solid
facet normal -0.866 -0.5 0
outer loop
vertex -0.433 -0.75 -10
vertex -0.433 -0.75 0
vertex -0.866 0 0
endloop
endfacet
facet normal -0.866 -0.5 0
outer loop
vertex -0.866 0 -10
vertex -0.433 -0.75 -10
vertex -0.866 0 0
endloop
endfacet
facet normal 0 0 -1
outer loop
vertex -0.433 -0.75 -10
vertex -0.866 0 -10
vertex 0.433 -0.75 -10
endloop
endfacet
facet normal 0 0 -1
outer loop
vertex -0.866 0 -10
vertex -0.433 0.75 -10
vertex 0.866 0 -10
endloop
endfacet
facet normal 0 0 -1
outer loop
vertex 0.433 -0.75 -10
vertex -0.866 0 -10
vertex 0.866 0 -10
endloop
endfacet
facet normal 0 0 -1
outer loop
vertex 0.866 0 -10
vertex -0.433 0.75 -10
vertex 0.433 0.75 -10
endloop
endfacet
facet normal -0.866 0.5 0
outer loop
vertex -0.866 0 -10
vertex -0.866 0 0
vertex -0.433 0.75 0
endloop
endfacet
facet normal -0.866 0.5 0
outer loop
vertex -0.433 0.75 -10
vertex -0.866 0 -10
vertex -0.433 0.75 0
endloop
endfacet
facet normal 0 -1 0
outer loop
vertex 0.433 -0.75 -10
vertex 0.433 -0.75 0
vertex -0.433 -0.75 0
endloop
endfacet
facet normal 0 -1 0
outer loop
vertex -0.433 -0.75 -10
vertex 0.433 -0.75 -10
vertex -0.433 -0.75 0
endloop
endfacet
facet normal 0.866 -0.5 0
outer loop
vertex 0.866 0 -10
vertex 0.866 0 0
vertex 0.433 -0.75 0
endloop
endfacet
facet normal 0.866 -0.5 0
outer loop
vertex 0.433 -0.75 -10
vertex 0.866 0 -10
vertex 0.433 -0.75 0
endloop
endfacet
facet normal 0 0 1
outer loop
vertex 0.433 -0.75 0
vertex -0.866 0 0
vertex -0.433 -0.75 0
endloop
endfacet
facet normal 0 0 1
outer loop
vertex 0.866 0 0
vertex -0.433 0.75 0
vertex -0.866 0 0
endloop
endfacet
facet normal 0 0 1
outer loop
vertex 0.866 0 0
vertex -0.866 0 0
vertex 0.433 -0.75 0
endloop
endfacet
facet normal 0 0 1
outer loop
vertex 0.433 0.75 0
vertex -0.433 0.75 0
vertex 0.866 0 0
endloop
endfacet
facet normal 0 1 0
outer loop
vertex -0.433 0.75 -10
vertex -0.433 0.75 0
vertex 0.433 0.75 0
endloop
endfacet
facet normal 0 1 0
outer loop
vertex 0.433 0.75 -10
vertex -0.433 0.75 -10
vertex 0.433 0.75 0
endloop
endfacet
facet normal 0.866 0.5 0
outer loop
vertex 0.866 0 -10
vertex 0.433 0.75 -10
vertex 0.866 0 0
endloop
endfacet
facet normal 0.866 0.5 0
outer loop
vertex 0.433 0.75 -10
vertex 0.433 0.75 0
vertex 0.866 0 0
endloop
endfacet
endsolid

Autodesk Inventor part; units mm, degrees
ref_plane "YZ Plane" through (0, 0, 0) normal (1, 0, 0) x (0, 1, 0)
ref_plane "XZ Plane" through (0, 0, 0) normal (0, 1, 0) x (-1, 0, 0)
ref_plane "XY Plane" through (0, 0, 0) normal (0, 0, 1) x (1, 0, 0)
sketch "Sketch1" plane through (0, 0, 0) normal (0, 0, 1) x (1, 0, 0)
  line L0 (0.866, 0) -> (0.433, -0.75)
  line L1 (0.433, -0.75) -> (-0.433, -0.75)
  line L2 (-0.433, -0.75) -> (-0.866, 0)
  line L3 (-0.866, 0) -> (-0.433, 0.75)
  line L4 (-0.433, 0.75) -> (0.433, 0.75)
  line L5 (0.433, 0.75) -> (0.866, 0)
  point P0 (0, 0)
  point P1 (0, 0)
  point P2 (0, 0.75)
  dimension "d3" = 0.75
extrude "Extrusion1" add sketch "Sketch1" against normal blind 10
properties part number "P88041_Wheel_Hex_Pin_C"
